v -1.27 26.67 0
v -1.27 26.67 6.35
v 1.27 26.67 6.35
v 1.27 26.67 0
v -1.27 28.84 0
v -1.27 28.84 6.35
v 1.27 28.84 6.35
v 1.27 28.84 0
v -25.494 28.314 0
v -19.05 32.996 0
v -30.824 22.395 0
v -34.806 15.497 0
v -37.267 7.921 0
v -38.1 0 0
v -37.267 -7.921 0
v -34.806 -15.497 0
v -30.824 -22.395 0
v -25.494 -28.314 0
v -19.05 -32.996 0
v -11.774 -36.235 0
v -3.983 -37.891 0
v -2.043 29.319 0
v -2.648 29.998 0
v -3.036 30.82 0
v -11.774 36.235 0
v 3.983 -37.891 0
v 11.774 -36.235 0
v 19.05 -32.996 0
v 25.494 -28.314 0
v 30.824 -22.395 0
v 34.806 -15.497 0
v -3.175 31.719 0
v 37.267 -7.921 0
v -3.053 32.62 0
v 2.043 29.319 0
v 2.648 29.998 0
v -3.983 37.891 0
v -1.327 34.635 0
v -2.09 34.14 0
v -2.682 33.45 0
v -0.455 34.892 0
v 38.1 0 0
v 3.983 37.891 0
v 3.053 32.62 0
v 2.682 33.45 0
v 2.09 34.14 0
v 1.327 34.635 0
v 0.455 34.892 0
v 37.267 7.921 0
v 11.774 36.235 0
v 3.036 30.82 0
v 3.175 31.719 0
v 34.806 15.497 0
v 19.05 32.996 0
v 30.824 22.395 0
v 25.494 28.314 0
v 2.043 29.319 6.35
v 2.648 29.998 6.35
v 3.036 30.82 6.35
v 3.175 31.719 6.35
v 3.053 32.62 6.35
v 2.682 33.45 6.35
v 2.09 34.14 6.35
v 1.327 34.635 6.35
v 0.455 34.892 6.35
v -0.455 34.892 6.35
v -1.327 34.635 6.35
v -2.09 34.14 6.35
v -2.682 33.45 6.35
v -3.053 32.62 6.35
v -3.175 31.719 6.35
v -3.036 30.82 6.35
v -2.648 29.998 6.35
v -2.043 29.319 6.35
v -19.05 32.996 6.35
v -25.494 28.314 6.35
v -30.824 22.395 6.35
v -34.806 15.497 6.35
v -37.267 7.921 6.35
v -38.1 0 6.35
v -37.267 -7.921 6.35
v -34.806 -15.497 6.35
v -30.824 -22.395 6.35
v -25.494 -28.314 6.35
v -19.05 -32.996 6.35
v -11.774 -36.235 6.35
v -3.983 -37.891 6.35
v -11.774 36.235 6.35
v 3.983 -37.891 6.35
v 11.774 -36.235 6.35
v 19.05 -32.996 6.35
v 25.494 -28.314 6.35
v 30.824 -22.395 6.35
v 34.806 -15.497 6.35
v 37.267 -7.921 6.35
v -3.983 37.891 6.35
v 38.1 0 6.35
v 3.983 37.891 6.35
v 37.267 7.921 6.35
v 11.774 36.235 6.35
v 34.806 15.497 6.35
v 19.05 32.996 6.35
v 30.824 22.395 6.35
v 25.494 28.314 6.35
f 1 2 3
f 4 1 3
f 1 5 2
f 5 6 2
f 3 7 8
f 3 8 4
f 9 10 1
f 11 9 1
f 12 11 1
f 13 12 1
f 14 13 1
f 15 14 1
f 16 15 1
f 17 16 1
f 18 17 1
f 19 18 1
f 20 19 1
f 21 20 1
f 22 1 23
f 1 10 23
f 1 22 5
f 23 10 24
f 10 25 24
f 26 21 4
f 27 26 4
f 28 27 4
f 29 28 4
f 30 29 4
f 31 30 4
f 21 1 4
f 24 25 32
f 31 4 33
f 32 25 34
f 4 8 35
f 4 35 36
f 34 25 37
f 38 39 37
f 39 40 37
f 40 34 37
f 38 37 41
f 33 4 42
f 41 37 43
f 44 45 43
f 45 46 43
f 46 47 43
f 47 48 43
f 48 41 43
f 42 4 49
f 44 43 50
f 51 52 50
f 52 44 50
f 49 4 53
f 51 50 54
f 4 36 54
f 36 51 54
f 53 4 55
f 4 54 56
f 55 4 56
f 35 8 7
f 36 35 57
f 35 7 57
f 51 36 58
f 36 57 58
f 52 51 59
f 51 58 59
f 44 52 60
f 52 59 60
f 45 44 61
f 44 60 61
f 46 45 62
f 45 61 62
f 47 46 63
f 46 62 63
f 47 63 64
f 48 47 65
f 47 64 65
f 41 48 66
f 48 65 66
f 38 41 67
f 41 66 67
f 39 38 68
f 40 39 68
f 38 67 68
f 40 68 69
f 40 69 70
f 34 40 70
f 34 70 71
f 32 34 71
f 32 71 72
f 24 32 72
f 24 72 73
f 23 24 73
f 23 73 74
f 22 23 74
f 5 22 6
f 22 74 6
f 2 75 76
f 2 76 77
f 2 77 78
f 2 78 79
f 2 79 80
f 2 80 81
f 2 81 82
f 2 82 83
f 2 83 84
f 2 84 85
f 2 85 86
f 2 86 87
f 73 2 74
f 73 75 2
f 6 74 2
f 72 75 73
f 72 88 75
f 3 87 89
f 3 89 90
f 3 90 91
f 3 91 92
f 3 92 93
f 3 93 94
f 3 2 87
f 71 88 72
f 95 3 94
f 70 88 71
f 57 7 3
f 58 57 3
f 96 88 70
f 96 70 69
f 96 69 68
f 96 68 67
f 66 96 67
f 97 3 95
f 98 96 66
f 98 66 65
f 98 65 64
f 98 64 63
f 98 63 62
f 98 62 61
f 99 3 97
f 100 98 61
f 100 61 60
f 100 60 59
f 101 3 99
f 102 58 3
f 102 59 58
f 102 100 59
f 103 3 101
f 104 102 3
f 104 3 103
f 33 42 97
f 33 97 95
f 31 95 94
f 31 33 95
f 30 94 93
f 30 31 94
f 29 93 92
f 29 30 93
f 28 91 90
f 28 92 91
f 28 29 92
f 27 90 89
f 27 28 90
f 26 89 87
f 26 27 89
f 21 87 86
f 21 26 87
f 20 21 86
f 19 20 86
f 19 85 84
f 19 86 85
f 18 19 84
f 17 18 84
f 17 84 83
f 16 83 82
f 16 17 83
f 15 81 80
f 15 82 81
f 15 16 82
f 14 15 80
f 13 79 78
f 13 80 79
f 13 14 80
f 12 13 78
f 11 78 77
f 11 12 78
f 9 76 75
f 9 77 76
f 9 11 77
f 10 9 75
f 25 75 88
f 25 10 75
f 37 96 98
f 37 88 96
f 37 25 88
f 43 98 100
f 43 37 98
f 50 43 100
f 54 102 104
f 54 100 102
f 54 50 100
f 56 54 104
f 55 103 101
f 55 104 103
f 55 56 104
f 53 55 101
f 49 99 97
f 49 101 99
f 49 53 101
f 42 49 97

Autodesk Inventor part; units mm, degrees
ref_plane "YZ Plane" through (0, 0, 0) normal (1, 0, 0) x (0, 1, 0)
ref_plane "XZ Plane" through (0, 0, 0) normal (0, 1, 0) x (-1, 0, 0)
ref_plane "XY Plane" through (0, 0, 0) normal (0, 0, 1) x (1, 0, 0)
sketch "Sketch1" plane through (0, 0, 0) normal (0, 0, 1) x (1, 0, 0)
  circle A0 centre (0, 0) radius 38.1
  dimension "d0" = 76.2
extrude "Extrusion1" add sketch "Sketch1" along normal blind 6.35
sketch "Sketch2" plane through (0, 0, 6.35) normal (0, 0, 1) x (1, 0, 0)
  circle A0 centre (0, 0) radius 38.1 projected
  circle A1 centre (0, 31.75) radius 3.175
  dimension "d3" = 6.35
  dimension "d6" = 31.75
extrude "Extrusion2" cut sketch "Sketch2" against normal through all contours A1
sketch "Sketch3" plane through (0, 0, 6.35) normal (0, 0, 1) x (1, 0, 0)
  circle A0 centre (0, 31.75) radius 3.175 projected
  line L0 (0, 31.75) -> (1.27, 31.75)
  line L1 (1.27, 31.75) -> (1.27, 26.67)
  line L2 (1.27, 26.67) -> (0, 26.67)
  line L3 (0, 26.67) -> (0, 31.75)
  line L4 (0, 31.75) -> (-1.27, 31.75)
  line L5 (-1.27, 31.75) -> (-1.27, 26.67)
  line L6 (-1.27, 26.67) -> (0, 26.67)
  line L7 (0, 26.67) -> (0, 31.75)
  dimension "d9" = 1.27
  dimension "d10" = 5.08
extrude "Extrusion3" cut sketch "Sketch3" against normal through all contours L5 L4 L3 A0 | A0 L3 L6 L5 | L1 L2 L3 A0 | A0 L3 L0 L1
properties part number "Circular Pattern"
